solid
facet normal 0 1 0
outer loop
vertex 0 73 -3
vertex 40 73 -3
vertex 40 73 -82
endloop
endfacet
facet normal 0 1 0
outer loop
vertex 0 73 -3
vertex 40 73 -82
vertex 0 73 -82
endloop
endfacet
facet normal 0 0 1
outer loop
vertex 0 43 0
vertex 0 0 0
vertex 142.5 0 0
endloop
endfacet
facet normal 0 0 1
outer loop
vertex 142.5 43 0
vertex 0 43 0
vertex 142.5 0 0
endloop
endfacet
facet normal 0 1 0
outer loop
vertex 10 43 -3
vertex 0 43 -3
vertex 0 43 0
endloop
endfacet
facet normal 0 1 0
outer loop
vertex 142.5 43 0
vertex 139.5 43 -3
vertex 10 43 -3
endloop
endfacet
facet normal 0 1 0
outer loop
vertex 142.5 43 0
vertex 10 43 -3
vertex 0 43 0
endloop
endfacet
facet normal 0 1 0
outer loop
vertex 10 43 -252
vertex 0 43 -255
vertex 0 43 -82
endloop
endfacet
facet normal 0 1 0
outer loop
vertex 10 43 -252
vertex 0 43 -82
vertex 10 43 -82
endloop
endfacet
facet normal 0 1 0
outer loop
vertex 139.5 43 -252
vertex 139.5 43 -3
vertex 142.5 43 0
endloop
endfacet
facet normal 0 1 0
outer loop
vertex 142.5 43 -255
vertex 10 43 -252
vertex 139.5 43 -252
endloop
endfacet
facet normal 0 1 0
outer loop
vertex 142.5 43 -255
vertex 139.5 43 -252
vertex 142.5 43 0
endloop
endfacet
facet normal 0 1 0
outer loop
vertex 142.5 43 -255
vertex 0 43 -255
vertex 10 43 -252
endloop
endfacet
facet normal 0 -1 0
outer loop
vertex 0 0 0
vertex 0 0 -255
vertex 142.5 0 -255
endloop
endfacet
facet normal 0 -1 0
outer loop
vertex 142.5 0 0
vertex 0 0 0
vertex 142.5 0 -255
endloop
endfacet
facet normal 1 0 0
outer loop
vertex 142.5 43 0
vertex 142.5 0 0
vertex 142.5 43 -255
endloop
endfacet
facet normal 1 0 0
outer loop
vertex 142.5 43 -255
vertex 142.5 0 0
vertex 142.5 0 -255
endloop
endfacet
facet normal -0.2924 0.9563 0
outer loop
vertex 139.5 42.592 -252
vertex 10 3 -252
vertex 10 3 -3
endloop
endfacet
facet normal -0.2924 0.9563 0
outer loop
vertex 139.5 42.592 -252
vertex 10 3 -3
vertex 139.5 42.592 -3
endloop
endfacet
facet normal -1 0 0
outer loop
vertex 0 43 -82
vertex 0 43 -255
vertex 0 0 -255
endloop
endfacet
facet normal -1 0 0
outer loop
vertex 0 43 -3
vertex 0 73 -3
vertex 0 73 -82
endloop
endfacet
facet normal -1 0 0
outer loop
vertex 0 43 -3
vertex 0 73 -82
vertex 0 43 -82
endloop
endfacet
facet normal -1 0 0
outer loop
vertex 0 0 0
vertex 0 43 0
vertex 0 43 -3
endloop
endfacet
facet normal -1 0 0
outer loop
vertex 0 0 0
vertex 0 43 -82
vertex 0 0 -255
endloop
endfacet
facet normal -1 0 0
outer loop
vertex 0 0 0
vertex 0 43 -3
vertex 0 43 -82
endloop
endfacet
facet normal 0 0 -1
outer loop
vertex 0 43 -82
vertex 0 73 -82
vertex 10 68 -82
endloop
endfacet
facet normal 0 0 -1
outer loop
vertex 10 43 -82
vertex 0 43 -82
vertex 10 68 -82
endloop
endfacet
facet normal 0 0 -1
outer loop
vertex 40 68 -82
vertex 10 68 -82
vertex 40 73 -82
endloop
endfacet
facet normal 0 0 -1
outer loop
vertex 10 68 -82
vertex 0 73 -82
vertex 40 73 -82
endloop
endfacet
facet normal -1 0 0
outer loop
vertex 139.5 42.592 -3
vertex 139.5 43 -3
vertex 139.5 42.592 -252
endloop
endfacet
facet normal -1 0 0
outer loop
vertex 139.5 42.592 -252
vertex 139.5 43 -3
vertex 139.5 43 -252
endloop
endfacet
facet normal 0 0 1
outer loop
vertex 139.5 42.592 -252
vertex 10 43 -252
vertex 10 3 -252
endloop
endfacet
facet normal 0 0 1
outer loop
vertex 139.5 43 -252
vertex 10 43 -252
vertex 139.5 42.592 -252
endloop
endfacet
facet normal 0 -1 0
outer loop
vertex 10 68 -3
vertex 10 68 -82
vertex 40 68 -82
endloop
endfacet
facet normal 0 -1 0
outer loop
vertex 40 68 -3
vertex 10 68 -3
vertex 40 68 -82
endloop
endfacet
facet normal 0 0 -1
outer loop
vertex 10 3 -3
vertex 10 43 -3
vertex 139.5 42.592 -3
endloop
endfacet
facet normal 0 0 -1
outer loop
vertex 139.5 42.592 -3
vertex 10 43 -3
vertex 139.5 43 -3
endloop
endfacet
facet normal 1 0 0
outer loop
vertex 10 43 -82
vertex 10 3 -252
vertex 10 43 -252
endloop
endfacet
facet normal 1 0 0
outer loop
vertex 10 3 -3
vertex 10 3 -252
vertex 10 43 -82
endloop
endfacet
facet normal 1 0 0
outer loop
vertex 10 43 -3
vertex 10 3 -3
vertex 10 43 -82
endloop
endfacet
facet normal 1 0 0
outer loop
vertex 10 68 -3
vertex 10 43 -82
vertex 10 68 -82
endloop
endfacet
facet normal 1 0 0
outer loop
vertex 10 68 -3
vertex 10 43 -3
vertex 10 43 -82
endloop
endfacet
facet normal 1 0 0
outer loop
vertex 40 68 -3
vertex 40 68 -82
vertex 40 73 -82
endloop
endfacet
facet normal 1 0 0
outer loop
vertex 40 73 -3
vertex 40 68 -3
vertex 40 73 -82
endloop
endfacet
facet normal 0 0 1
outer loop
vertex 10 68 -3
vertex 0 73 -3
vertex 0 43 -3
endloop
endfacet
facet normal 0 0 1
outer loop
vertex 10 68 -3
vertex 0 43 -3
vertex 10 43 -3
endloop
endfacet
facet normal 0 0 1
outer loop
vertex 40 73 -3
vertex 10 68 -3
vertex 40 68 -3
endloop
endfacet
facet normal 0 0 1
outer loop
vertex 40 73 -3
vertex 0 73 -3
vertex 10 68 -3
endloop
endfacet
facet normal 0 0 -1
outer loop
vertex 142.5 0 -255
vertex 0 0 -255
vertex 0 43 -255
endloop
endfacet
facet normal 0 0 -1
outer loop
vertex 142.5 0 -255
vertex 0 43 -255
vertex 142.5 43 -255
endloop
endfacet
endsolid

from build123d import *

# Parameters (mm, degrees)
SKETCH1_W           = 142.5
SKETCH1_H           = 255
BOSS_EXTRUDE1_DEPTH = 43
SKETCH2_W           = 129.5
SKETCH2_H           = 249
CUT_EXTRUDE1_DEPTH  = 40
BOSS_EXTRUDE2_DEPTH = 79
BOSS_EXTRUDE3_DEPTH = 250


with BuildPart() as part:
    # Sketch1 → Boss-Extrude1 (new body)
    with BuildSketch(Plane(origin=(0, 0, 0), x_dir=(1, 0, 0), z_dir=(0, 1, 0))):
        with Locations((71.25, 127.5)):
            Rectangle(SKETCH1_W, SKETCH1_H)
    extrude(amount=BOSS_EXTRUDE1_DEPTH)

    # Sketch2 → Cut-Extrude1 (cut)
    with BuildSketch(Plane(origin=(0, 43, 0), x_dir=(1, 0, 0), z_dir=(0, 1, 0))):
        with Locations((74.75, 127.5)):
            Rectangle(SKETCH2_W, SKETCH2_H)
    extrude(amount=-CUT_EXTRUDE1_DEPTH, mode=Mode.SUBTRACT)

    # Sketch5 → Boss-Extrude2 (add)
    with BuildSketch(Plane.XY.offset(-3)):
        Polygon((10, 43), (10, 68), (40, 68), (40, 73), (0, 73), (0, 43), align=None)
    extrude(amount=-BOSS_EXTRUDE2_DEPTH)

    # Sketch6 → Boss-Extrude3 (add)
    with BuildSketch(Plane.XY.offset(-3)):
        Polygon((10, 3), (139.5, 42.592123249), (139.5, 3), align=None)
    extrude(amount=-BOSS_EXTRUDE3_DEPTH)


solid = part.part
